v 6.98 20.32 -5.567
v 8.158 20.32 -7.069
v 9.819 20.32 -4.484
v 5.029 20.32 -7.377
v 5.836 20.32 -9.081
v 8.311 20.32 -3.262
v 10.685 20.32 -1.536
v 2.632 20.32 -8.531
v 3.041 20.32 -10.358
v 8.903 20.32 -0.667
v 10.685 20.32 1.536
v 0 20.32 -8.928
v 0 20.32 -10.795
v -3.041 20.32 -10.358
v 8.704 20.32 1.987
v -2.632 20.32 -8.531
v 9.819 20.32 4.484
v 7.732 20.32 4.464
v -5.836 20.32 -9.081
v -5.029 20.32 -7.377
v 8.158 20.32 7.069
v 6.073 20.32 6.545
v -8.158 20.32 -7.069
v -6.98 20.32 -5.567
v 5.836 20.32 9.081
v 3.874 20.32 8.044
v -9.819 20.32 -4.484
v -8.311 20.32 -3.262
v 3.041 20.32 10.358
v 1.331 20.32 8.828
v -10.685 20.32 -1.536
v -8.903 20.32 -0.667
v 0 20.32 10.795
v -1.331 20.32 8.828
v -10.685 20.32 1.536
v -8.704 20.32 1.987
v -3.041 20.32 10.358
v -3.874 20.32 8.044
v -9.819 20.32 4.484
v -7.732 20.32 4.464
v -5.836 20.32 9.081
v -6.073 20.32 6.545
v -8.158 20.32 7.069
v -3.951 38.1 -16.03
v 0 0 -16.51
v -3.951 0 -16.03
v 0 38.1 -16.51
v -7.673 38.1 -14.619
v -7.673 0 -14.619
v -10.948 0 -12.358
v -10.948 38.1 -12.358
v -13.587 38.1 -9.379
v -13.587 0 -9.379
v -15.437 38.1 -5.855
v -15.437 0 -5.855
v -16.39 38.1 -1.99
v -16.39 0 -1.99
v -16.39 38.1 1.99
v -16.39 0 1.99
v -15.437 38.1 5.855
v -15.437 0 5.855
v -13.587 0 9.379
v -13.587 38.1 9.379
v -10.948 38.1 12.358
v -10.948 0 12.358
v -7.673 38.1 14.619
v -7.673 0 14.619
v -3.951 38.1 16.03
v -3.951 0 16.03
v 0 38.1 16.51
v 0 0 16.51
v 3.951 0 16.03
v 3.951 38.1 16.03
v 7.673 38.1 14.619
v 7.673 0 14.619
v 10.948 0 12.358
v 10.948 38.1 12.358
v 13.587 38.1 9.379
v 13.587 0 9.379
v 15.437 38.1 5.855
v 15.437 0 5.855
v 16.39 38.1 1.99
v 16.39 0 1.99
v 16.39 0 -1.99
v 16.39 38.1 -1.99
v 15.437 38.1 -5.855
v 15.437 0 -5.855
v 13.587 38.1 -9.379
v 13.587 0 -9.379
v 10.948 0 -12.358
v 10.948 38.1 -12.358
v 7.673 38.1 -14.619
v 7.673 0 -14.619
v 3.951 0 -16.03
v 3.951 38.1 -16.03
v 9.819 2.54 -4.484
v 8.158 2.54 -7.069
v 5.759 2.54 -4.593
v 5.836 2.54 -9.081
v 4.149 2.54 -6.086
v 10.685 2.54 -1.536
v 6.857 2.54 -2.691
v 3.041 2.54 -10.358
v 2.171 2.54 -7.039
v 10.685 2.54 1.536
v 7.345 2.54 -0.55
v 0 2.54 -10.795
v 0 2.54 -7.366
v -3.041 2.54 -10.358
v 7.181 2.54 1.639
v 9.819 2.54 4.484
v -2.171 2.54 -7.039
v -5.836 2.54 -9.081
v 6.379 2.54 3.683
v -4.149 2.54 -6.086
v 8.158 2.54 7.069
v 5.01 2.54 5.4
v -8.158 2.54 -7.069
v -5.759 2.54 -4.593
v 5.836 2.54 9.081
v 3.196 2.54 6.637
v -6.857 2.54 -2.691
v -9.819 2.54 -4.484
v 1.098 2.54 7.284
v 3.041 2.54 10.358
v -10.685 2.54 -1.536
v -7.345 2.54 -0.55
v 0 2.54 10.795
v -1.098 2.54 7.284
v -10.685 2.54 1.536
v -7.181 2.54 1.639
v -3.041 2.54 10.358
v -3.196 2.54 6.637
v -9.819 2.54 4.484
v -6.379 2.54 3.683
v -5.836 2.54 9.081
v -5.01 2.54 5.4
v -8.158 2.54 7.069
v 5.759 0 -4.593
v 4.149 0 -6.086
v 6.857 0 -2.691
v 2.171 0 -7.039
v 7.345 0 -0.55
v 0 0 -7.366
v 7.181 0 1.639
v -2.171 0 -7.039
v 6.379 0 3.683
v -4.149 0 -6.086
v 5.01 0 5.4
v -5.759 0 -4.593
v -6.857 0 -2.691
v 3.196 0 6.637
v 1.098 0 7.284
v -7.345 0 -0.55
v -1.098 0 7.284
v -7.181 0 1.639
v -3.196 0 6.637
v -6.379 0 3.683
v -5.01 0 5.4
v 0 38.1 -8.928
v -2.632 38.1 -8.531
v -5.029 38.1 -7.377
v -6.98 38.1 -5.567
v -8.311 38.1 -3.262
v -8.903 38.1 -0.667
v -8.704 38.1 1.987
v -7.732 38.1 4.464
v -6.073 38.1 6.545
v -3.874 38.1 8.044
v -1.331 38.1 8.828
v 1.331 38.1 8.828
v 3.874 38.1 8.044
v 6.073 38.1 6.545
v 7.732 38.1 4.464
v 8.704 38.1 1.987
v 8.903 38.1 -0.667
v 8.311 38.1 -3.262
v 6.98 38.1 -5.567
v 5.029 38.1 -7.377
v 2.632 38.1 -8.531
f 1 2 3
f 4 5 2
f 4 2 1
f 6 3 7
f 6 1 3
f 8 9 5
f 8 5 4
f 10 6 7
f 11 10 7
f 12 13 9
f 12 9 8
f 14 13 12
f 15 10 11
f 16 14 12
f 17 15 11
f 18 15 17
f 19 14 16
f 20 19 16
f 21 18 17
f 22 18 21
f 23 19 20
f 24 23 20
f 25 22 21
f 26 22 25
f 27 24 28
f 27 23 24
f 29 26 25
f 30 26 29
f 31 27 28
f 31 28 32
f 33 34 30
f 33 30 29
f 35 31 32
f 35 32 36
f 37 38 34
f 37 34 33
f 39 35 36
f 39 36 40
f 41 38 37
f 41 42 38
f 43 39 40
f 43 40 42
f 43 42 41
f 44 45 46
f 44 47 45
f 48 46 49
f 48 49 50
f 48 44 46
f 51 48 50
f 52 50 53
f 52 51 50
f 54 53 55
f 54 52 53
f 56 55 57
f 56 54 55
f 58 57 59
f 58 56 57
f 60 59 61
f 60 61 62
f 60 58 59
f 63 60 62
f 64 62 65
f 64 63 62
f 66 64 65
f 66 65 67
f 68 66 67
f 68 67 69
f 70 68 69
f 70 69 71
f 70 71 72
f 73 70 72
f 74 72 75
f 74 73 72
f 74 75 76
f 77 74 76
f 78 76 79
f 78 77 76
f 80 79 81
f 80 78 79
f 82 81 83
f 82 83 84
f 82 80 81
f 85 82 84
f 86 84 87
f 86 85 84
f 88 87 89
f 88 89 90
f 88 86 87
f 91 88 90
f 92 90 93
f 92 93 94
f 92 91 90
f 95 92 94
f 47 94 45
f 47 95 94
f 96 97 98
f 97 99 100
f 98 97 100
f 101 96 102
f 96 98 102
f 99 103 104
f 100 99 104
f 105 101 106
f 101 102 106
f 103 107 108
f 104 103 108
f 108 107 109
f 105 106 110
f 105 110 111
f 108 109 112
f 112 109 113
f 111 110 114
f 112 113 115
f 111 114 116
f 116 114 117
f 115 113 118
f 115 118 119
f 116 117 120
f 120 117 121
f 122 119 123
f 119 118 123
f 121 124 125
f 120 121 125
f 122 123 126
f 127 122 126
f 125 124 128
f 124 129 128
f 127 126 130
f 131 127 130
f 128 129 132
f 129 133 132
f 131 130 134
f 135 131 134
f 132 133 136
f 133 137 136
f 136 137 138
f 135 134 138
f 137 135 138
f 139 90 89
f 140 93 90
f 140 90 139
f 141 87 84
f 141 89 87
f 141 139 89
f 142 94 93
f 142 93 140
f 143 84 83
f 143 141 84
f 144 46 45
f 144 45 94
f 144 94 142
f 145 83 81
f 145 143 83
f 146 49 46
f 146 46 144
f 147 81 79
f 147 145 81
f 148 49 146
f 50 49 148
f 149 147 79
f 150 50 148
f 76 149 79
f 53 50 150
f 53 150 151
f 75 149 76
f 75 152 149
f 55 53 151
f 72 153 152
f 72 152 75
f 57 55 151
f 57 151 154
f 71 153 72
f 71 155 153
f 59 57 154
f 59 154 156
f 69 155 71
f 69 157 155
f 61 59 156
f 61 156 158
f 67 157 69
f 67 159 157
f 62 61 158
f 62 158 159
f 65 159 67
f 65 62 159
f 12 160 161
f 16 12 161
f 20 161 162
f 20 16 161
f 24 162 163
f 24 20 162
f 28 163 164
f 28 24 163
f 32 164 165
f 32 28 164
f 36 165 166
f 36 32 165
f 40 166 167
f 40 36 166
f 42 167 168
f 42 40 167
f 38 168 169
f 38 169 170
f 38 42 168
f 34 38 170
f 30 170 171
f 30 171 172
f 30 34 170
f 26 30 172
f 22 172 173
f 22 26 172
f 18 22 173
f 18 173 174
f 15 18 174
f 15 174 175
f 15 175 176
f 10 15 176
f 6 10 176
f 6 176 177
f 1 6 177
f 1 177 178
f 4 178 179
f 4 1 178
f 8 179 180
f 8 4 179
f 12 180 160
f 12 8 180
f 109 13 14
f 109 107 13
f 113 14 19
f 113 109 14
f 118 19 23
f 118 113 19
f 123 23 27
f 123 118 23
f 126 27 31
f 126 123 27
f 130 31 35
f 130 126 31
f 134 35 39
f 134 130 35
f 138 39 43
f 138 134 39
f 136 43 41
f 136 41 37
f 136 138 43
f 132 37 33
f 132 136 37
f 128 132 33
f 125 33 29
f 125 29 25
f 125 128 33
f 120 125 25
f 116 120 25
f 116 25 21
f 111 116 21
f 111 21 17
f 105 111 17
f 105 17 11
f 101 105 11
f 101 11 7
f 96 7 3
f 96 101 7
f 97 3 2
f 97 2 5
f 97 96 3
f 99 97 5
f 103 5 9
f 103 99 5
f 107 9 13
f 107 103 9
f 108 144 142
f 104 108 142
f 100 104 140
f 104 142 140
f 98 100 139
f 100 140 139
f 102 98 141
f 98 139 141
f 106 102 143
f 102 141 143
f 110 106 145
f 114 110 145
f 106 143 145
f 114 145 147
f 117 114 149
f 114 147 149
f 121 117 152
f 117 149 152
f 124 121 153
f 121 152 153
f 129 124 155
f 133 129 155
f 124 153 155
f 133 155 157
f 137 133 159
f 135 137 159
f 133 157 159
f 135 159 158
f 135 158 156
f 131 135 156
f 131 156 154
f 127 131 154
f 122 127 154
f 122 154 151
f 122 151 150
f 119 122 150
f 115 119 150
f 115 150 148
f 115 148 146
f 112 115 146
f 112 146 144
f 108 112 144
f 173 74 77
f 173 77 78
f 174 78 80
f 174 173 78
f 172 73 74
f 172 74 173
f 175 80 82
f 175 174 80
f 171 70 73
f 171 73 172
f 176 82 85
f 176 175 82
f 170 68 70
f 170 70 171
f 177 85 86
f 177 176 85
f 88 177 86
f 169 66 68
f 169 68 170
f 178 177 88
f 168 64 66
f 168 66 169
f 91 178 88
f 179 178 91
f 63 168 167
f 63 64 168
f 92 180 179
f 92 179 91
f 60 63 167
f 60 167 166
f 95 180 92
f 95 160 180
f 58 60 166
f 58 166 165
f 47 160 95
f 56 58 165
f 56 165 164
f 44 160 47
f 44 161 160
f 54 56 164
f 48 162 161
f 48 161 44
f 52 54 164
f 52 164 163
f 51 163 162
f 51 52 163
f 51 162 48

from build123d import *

# Parameters (mm, degrees)
CUT_EXTRUDE1_REACH = 46.685
SKETCH2_R          = 7.366


with BuildPart() as part:
    # Sketch1 → Revolve1 (revolve)
    with BuildSketch(Plane(origin=(0, 0, 0), x_dir=(0, 0, -1), z_dir=(1, 0, 0)), mode=Mode.PRIVATE) as revolve1_sk:
        Polygon((0, 0), (-16.51, 0), (-16.51, 38.1), (-8.9281, 38.1), (-8.9281, 20.32), (-10.795, 20.32), (-10.795, 2.54), (-8.9281, 2.54), (0, 2.54), align=None)
    revolve(revolve1_sk.sketch.rotate(Axis((0, 0, 0), (0, 1, 0)), 180), axis=Axis((0, 0, 0), (0, 1, 0)))

    # Sketch2 → Cut-Extrude1 (cut, up to next)
    with BuildSketch(Plane.XZ, mode=Mode.PRIVATE) as cut_extrude1_sk1:
        with Locations(Location((0, 0, 0), (0, 0, 270))):
            Circle(SKETCH2_R)
    cut_extrude1_tool1 = extrude(cut_extrude1_sk1.sketch, amount=-CUT_EXTRUDE1_REACH, mode=Mode.PRIVATE) & part.part
    add(cut_extrude1_tool1.solids().sort_by_distance((0, 0, 0))[0], mode=Mode.SUBTRACT)


solid = part.part
